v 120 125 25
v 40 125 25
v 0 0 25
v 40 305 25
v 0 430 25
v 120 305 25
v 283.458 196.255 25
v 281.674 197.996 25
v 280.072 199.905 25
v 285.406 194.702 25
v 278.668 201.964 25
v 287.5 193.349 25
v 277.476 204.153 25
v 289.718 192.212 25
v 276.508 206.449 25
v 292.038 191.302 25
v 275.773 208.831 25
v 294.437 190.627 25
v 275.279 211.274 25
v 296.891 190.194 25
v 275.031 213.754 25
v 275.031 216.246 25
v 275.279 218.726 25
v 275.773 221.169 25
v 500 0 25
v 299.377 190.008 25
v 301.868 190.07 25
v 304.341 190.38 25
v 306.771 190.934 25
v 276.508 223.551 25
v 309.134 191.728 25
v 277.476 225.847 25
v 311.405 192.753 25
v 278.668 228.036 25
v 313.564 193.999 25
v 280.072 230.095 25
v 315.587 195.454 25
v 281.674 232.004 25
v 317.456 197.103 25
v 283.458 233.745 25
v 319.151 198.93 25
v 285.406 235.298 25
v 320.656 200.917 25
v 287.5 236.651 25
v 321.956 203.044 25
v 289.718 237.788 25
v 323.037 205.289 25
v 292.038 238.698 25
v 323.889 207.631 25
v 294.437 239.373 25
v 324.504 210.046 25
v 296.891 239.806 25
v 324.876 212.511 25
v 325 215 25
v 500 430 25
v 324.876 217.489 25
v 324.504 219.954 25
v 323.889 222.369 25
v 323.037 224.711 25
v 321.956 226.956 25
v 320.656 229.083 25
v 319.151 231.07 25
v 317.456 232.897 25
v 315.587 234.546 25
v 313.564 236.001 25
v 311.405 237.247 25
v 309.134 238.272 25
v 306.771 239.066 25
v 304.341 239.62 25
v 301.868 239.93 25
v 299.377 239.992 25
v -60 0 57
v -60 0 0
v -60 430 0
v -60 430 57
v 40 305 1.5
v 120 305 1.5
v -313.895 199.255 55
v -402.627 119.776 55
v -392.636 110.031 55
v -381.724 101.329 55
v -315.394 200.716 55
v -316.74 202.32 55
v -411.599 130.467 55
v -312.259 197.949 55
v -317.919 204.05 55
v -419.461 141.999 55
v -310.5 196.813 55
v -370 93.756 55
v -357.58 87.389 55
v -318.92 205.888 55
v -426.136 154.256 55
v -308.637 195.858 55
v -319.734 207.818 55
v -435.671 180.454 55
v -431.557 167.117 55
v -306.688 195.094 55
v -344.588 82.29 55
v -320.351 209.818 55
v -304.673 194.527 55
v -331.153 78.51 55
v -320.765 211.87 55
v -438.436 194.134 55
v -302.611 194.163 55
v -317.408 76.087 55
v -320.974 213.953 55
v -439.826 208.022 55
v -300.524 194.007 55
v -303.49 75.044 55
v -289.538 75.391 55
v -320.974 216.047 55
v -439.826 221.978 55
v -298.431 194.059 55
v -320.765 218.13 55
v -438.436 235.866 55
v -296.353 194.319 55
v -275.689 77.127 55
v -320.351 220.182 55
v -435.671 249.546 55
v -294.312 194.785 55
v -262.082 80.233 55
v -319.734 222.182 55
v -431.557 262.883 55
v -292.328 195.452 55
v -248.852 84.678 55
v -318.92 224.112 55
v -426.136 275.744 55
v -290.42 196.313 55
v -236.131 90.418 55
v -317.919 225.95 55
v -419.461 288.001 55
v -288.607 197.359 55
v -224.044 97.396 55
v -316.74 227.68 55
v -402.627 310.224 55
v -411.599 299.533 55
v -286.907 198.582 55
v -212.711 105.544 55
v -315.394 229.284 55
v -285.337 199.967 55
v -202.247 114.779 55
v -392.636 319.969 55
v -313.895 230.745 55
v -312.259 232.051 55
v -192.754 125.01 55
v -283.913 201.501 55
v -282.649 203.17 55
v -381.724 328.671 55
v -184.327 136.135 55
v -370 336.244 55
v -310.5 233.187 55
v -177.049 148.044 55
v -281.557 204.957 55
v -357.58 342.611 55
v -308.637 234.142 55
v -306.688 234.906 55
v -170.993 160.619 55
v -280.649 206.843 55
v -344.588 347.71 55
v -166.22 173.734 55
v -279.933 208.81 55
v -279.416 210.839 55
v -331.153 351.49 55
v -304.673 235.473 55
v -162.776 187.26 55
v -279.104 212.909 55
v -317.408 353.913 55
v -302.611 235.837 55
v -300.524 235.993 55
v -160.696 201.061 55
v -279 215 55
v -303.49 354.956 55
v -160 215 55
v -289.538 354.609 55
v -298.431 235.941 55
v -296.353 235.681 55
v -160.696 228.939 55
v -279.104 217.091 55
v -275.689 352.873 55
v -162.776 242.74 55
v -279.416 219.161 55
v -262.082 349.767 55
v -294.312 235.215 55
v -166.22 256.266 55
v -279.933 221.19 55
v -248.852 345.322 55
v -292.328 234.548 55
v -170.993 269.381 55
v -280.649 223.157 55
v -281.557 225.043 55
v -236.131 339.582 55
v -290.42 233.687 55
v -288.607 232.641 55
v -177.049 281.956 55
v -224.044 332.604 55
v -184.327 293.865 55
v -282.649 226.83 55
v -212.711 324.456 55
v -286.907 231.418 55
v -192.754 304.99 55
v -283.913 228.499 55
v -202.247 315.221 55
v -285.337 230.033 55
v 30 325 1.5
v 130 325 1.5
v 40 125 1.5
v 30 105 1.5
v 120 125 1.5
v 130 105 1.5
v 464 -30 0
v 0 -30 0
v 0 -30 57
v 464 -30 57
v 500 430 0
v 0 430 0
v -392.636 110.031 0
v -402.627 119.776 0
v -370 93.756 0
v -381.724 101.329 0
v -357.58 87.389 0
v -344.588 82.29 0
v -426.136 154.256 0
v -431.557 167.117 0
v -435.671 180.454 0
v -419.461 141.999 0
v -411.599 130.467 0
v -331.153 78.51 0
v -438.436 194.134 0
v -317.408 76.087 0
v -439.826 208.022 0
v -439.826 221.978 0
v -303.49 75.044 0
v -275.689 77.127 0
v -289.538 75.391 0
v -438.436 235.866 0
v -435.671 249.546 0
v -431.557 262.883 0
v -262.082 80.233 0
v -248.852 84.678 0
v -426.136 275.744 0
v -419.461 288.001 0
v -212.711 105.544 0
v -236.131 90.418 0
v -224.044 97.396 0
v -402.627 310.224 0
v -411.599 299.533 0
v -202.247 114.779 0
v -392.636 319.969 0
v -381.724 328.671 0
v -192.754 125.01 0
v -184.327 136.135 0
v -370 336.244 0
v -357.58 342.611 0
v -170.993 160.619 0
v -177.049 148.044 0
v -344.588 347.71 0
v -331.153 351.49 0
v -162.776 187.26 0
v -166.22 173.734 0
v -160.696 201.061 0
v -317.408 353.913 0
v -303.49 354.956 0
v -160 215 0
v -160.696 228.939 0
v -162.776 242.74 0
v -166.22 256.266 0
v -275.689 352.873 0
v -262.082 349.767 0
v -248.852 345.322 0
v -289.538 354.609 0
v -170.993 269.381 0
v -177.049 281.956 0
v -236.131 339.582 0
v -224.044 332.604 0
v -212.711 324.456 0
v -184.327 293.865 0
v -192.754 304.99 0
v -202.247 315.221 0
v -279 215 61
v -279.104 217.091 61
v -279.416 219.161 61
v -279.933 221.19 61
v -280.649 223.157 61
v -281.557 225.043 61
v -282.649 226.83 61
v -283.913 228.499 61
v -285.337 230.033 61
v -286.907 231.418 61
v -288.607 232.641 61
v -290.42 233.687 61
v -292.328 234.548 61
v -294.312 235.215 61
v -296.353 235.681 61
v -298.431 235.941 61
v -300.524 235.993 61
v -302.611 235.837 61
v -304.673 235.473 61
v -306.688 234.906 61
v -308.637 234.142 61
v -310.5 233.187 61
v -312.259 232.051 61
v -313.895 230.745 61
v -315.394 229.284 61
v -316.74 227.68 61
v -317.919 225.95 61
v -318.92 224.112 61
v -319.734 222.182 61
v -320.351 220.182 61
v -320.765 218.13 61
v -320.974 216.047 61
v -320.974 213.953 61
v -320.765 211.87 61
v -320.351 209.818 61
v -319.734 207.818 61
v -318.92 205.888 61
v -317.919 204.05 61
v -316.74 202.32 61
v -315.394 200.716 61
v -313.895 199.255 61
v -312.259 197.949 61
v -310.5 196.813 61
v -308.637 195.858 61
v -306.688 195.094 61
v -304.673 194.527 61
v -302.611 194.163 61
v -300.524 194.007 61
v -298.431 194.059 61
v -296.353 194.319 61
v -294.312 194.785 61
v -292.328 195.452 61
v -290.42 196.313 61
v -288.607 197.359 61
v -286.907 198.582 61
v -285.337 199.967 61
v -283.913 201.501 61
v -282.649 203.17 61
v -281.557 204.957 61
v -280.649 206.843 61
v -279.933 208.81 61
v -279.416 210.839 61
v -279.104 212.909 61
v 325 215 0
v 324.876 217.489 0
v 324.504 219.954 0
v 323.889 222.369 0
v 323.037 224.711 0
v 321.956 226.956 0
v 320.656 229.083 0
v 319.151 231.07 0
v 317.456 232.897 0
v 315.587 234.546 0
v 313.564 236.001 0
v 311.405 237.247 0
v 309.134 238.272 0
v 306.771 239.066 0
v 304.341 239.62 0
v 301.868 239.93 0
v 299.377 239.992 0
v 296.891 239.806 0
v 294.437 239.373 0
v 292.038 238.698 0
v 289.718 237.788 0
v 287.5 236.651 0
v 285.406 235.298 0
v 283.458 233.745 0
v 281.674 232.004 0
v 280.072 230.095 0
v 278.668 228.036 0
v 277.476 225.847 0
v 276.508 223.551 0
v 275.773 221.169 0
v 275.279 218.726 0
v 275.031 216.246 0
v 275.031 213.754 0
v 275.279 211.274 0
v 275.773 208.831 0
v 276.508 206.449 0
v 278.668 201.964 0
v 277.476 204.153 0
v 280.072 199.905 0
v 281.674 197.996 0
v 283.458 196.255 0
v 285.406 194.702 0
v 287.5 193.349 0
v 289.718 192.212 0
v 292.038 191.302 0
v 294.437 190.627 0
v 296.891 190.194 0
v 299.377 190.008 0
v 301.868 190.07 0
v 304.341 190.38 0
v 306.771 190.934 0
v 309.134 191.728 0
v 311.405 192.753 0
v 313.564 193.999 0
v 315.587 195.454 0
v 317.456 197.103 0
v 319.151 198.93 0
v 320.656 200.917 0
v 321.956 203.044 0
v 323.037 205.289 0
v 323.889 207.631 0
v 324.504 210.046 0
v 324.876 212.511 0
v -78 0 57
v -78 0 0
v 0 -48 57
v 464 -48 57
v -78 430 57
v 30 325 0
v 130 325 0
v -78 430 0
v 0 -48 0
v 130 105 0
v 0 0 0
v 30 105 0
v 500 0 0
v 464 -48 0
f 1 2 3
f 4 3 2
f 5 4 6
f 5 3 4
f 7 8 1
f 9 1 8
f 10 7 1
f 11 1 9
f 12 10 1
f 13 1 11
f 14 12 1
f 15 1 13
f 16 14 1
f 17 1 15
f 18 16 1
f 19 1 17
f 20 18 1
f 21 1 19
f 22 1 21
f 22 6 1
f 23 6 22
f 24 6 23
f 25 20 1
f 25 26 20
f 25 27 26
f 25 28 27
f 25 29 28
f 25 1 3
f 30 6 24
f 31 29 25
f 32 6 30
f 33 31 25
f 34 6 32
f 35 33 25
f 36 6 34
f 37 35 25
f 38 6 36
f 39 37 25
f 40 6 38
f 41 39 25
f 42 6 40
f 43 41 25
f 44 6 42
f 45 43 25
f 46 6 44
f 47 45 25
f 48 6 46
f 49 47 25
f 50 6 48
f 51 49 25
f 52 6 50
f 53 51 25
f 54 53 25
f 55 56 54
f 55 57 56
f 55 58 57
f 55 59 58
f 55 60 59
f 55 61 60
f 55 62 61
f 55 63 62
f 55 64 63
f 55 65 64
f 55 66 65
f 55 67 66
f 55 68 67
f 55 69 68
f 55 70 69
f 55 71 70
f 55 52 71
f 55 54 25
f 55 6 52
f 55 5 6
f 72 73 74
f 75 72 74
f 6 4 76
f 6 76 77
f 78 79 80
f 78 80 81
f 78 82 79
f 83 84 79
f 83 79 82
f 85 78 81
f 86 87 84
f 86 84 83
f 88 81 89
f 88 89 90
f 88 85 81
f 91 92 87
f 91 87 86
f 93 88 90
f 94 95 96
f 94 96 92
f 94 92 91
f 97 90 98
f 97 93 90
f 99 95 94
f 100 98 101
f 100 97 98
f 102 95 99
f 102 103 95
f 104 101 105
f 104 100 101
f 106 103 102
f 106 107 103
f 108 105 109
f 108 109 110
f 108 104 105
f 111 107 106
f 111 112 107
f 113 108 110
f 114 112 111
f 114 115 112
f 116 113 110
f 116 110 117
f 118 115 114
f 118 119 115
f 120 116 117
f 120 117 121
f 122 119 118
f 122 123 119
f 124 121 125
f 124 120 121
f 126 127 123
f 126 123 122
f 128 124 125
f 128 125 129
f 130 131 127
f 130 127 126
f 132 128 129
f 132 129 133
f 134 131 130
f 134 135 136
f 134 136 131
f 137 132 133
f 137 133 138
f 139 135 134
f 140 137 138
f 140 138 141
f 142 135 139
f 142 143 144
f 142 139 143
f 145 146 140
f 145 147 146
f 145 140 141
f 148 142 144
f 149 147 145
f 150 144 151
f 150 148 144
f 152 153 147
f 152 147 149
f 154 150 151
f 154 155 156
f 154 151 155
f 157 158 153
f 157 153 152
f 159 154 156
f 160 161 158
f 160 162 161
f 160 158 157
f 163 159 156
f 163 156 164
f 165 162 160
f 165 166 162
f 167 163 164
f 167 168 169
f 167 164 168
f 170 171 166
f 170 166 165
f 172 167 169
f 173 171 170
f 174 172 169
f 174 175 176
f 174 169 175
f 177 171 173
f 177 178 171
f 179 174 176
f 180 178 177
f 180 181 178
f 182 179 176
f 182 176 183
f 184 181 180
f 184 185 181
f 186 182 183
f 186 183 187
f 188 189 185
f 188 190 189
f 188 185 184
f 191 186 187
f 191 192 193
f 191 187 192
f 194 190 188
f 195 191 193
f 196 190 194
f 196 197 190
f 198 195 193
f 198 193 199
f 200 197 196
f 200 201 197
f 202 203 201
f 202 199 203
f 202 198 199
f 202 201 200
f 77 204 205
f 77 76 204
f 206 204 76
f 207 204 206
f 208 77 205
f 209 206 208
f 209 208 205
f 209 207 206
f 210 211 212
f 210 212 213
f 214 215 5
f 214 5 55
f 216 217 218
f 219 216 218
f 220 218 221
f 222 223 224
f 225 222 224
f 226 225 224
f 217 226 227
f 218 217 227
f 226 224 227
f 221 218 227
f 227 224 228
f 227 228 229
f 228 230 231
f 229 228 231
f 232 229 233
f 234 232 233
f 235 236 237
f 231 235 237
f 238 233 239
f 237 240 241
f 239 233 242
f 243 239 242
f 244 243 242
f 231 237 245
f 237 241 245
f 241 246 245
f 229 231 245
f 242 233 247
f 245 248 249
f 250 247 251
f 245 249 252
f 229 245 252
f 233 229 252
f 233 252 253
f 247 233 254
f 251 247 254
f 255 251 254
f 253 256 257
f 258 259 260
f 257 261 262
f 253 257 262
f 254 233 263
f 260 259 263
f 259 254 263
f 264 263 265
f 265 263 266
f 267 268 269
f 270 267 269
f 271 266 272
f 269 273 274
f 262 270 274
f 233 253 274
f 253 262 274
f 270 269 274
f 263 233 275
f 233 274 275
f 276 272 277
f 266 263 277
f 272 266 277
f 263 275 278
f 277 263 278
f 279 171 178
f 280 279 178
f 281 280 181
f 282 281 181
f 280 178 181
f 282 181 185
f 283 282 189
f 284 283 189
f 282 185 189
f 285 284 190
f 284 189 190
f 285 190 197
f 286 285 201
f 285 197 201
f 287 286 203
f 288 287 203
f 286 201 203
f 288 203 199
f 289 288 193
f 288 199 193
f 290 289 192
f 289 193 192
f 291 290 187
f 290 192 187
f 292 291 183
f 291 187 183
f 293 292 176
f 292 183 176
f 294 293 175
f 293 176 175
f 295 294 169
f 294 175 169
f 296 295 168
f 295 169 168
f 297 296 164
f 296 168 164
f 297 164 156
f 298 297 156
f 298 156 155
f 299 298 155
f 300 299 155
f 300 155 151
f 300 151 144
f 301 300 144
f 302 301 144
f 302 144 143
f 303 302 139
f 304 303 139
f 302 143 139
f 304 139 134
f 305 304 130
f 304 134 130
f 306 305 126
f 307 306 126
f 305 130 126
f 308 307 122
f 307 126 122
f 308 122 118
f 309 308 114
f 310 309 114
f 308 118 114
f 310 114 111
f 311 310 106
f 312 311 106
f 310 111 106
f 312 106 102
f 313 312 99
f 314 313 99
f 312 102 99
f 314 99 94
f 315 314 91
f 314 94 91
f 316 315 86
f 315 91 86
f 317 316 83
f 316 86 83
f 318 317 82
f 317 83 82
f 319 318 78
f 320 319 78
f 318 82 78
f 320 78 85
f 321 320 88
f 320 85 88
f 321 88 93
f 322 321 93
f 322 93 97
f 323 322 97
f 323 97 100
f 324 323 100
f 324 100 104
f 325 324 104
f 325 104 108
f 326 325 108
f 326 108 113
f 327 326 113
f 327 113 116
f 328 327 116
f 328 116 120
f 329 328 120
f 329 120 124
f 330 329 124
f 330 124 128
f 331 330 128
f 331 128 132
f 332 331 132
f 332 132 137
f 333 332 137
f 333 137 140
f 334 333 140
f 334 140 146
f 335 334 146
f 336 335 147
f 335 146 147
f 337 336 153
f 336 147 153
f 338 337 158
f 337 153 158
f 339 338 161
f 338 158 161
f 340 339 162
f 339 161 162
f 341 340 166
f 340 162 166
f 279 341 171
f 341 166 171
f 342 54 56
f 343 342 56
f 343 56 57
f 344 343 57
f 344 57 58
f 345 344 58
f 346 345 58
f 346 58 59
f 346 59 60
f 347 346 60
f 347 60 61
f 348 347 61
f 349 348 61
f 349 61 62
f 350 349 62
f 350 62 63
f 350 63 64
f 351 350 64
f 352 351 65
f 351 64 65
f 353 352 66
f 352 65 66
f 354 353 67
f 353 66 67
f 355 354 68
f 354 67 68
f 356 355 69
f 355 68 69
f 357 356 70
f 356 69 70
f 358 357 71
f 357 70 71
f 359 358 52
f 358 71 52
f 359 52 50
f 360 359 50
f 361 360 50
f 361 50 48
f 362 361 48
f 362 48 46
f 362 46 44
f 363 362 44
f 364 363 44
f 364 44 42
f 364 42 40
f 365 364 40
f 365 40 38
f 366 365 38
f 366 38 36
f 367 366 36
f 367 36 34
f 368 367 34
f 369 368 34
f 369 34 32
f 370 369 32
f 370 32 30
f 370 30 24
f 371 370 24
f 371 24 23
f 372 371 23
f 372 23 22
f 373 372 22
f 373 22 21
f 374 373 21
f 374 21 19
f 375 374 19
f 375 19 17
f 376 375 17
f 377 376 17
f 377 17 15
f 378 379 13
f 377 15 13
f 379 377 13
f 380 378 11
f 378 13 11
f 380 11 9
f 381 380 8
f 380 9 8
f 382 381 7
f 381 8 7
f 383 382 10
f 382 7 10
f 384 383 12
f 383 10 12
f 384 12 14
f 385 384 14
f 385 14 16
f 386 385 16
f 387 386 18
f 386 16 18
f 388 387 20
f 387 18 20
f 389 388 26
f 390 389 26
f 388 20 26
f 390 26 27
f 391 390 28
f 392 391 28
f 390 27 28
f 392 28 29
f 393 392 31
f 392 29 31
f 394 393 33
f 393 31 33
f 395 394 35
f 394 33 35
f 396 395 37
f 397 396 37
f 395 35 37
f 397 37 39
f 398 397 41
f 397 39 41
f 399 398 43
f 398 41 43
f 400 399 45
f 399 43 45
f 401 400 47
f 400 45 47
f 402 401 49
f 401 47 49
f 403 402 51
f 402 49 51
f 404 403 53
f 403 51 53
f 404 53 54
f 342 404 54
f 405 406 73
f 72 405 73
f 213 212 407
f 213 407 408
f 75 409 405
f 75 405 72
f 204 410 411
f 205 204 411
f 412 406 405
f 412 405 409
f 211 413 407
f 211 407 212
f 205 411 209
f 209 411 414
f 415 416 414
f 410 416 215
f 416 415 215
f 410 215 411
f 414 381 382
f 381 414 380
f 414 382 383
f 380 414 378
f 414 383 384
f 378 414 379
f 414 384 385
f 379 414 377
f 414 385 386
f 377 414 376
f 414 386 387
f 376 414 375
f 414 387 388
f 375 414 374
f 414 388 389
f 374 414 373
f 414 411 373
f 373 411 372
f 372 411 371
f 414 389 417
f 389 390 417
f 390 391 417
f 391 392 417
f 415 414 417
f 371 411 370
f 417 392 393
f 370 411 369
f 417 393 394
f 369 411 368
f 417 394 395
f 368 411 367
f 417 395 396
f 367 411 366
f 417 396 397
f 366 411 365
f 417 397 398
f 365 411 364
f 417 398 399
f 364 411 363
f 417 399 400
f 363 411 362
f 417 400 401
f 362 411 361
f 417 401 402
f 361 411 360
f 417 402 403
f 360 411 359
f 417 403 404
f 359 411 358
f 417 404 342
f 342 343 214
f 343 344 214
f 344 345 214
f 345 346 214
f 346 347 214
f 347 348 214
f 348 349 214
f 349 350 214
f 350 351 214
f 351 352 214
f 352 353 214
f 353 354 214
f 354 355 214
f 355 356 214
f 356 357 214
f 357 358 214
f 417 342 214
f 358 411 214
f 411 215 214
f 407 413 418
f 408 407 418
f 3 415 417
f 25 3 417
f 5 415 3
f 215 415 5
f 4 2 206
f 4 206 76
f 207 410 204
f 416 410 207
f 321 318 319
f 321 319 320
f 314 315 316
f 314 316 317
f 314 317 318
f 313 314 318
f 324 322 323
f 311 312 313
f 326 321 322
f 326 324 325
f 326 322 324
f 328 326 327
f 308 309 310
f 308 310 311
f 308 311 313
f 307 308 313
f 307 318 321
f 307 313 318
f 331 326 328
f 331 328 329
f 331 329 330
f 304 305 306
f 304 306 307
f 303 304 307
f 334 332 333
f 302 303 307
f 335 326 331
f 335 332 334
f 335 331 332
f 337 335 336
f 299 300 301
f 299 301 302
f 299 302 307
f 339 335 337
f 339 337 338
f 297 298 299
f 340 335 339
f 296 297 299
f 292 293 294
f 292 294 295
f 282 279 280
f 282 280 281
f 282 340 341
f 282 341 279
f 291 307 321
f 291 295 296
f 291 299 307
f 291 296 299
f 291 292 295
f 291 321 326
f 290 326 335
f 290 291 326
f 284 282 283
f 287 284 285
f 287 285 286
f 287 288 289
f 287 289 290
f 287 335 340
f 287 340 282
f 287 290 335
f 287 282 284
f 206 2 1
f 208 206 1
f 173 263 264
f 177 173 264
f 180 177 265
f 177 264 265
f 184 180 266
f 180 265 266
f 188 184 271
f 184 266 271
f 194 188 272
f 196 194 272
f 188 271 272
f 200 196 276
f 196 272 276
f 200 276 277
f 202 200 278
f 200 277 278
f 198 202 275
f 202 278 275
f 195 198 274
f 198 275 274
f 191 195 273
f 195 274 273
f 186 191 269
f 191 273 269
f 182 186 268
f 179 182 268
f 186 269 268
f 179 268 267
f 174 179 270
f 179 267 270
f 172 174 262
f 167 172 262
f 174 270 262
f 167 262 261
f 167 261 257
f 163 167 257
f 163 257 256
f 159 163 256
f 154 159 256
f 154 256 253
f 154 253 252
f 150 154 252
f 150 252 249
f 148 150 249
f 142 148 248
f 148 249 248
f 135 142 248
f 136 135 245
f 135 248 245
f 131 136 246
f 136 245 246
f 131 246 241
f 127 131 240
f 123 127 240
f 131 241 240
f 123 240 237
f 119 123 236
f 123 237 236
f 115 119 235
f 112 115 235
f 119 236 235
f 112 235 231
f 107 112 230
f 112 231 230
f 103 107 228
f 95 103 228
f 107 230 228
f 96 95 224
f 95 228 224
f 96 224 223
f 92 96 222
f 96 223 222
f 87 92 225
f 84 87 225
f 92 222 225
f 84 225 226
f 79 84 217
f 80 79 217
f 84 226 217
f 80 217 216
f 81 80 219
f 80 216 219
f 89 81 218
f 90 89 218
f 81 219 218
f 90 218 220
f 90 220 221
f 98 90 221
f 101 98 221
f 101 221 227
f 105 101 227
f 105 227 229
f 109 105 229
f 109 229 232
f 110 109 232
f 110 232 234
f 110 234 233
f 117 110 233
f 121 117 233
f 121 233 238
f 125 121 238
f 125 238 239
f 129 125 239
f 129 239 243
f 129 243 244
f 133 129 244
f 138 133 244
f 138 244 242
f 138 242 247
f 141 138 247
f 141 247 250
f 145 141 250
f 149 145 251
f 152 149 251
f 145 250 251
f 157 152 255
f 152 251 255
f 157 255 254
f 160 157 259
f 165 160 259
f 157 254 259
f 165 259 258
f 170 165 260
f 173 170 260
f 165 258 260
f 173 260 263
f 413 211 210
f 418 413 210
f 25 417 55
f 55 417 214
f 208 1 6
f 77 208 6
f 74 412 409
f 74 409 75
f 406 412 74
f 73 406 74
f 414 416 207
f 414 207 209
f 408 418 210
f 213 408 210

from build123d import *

# Parameters (mm, degrees)
F0_W      = 500
F0_H      = 430
F1_DEPTH  = 25
F3_R      = 140
F4_DEPTH  = 55
F5_R      = 21
F6_DEPTH  = 6
F7_W      = 18
F7_H      = 430
F7_W_2    = 464
F7_H_2    = 18
F8_DEPTH  = 57
F2_W      = 80
F2_H      = 180
F2_R      = 25
F9_DEPTH  = 25.001
F10_W     = 100
F10_H     = 220
F10_W_2   = 80
F10_H_2   = 180
F11_DEPTH = 1.5


with BuildPart() as f1:
    # F0 (on Top) → F1 (new body)
    with BuildSketch(Plane.XY):
        with Locations((250, 215)):
            Rectangle(F0_W, F0_H)
    extrude(amount=F1_DEPTH)

    # F2 (on face) → F9 (cut, through all)
    with BuildSketch(Plane.XY.offset(25)):
        with Locations((80, 215)):
            Rectangle(F2_W, F2_H)
        with Locations((300, 215)):
            Circle(F2_R)
    extrude(amount=-F9_DEPTH, mode=Mode.SUBTRACT)

    # F10 (on face) → F11 (cut)
    with BuildSketch(Plane(origin=(0, 0, 0), x_dir=(1, 0, 0), z_dir=(0, 0, -1))):
        with Locations((80, -215)):
            Rectangle(F10_W, F10_H)
        with Locations((80, -215)):
            Rectangle(F10_W_2, F10_H_2, mode=Mode.SUBTRACT)
    extrude(amount=-F11_DEPTH, mode=Mode.SUBTRACT)


with BuildPart() as f4:
    # F3 (on Top) → F4 (new body)
    with BuildSketch(Plane.XY):
        with Locations((-300, 215)):
            Circle(F3_R)
    extrude(amount=F4_DEPTH)

    # F5 (on face) → F6 (join)
    with BuildSketch(Plane.XY.offset(55)):
        with Locations((-300, 215)):
            Circle(F5_R)
    extrude(amount=F6_DEPTH)


with BuildPart() as f8:
    # F7 (on Top) → F8 (new body)
    with BuildSketch(Plane.XY):
        with Locations((-69, 215)):
            Rectangle(F7_W, F7_H)
        with Locations((232, -39)):
            Rectangle(F7_W_2, F7_H_2)
    extrude(amount=F8_DEPTH)


solid = Compound([f1.part, f4.part, f8.part])
